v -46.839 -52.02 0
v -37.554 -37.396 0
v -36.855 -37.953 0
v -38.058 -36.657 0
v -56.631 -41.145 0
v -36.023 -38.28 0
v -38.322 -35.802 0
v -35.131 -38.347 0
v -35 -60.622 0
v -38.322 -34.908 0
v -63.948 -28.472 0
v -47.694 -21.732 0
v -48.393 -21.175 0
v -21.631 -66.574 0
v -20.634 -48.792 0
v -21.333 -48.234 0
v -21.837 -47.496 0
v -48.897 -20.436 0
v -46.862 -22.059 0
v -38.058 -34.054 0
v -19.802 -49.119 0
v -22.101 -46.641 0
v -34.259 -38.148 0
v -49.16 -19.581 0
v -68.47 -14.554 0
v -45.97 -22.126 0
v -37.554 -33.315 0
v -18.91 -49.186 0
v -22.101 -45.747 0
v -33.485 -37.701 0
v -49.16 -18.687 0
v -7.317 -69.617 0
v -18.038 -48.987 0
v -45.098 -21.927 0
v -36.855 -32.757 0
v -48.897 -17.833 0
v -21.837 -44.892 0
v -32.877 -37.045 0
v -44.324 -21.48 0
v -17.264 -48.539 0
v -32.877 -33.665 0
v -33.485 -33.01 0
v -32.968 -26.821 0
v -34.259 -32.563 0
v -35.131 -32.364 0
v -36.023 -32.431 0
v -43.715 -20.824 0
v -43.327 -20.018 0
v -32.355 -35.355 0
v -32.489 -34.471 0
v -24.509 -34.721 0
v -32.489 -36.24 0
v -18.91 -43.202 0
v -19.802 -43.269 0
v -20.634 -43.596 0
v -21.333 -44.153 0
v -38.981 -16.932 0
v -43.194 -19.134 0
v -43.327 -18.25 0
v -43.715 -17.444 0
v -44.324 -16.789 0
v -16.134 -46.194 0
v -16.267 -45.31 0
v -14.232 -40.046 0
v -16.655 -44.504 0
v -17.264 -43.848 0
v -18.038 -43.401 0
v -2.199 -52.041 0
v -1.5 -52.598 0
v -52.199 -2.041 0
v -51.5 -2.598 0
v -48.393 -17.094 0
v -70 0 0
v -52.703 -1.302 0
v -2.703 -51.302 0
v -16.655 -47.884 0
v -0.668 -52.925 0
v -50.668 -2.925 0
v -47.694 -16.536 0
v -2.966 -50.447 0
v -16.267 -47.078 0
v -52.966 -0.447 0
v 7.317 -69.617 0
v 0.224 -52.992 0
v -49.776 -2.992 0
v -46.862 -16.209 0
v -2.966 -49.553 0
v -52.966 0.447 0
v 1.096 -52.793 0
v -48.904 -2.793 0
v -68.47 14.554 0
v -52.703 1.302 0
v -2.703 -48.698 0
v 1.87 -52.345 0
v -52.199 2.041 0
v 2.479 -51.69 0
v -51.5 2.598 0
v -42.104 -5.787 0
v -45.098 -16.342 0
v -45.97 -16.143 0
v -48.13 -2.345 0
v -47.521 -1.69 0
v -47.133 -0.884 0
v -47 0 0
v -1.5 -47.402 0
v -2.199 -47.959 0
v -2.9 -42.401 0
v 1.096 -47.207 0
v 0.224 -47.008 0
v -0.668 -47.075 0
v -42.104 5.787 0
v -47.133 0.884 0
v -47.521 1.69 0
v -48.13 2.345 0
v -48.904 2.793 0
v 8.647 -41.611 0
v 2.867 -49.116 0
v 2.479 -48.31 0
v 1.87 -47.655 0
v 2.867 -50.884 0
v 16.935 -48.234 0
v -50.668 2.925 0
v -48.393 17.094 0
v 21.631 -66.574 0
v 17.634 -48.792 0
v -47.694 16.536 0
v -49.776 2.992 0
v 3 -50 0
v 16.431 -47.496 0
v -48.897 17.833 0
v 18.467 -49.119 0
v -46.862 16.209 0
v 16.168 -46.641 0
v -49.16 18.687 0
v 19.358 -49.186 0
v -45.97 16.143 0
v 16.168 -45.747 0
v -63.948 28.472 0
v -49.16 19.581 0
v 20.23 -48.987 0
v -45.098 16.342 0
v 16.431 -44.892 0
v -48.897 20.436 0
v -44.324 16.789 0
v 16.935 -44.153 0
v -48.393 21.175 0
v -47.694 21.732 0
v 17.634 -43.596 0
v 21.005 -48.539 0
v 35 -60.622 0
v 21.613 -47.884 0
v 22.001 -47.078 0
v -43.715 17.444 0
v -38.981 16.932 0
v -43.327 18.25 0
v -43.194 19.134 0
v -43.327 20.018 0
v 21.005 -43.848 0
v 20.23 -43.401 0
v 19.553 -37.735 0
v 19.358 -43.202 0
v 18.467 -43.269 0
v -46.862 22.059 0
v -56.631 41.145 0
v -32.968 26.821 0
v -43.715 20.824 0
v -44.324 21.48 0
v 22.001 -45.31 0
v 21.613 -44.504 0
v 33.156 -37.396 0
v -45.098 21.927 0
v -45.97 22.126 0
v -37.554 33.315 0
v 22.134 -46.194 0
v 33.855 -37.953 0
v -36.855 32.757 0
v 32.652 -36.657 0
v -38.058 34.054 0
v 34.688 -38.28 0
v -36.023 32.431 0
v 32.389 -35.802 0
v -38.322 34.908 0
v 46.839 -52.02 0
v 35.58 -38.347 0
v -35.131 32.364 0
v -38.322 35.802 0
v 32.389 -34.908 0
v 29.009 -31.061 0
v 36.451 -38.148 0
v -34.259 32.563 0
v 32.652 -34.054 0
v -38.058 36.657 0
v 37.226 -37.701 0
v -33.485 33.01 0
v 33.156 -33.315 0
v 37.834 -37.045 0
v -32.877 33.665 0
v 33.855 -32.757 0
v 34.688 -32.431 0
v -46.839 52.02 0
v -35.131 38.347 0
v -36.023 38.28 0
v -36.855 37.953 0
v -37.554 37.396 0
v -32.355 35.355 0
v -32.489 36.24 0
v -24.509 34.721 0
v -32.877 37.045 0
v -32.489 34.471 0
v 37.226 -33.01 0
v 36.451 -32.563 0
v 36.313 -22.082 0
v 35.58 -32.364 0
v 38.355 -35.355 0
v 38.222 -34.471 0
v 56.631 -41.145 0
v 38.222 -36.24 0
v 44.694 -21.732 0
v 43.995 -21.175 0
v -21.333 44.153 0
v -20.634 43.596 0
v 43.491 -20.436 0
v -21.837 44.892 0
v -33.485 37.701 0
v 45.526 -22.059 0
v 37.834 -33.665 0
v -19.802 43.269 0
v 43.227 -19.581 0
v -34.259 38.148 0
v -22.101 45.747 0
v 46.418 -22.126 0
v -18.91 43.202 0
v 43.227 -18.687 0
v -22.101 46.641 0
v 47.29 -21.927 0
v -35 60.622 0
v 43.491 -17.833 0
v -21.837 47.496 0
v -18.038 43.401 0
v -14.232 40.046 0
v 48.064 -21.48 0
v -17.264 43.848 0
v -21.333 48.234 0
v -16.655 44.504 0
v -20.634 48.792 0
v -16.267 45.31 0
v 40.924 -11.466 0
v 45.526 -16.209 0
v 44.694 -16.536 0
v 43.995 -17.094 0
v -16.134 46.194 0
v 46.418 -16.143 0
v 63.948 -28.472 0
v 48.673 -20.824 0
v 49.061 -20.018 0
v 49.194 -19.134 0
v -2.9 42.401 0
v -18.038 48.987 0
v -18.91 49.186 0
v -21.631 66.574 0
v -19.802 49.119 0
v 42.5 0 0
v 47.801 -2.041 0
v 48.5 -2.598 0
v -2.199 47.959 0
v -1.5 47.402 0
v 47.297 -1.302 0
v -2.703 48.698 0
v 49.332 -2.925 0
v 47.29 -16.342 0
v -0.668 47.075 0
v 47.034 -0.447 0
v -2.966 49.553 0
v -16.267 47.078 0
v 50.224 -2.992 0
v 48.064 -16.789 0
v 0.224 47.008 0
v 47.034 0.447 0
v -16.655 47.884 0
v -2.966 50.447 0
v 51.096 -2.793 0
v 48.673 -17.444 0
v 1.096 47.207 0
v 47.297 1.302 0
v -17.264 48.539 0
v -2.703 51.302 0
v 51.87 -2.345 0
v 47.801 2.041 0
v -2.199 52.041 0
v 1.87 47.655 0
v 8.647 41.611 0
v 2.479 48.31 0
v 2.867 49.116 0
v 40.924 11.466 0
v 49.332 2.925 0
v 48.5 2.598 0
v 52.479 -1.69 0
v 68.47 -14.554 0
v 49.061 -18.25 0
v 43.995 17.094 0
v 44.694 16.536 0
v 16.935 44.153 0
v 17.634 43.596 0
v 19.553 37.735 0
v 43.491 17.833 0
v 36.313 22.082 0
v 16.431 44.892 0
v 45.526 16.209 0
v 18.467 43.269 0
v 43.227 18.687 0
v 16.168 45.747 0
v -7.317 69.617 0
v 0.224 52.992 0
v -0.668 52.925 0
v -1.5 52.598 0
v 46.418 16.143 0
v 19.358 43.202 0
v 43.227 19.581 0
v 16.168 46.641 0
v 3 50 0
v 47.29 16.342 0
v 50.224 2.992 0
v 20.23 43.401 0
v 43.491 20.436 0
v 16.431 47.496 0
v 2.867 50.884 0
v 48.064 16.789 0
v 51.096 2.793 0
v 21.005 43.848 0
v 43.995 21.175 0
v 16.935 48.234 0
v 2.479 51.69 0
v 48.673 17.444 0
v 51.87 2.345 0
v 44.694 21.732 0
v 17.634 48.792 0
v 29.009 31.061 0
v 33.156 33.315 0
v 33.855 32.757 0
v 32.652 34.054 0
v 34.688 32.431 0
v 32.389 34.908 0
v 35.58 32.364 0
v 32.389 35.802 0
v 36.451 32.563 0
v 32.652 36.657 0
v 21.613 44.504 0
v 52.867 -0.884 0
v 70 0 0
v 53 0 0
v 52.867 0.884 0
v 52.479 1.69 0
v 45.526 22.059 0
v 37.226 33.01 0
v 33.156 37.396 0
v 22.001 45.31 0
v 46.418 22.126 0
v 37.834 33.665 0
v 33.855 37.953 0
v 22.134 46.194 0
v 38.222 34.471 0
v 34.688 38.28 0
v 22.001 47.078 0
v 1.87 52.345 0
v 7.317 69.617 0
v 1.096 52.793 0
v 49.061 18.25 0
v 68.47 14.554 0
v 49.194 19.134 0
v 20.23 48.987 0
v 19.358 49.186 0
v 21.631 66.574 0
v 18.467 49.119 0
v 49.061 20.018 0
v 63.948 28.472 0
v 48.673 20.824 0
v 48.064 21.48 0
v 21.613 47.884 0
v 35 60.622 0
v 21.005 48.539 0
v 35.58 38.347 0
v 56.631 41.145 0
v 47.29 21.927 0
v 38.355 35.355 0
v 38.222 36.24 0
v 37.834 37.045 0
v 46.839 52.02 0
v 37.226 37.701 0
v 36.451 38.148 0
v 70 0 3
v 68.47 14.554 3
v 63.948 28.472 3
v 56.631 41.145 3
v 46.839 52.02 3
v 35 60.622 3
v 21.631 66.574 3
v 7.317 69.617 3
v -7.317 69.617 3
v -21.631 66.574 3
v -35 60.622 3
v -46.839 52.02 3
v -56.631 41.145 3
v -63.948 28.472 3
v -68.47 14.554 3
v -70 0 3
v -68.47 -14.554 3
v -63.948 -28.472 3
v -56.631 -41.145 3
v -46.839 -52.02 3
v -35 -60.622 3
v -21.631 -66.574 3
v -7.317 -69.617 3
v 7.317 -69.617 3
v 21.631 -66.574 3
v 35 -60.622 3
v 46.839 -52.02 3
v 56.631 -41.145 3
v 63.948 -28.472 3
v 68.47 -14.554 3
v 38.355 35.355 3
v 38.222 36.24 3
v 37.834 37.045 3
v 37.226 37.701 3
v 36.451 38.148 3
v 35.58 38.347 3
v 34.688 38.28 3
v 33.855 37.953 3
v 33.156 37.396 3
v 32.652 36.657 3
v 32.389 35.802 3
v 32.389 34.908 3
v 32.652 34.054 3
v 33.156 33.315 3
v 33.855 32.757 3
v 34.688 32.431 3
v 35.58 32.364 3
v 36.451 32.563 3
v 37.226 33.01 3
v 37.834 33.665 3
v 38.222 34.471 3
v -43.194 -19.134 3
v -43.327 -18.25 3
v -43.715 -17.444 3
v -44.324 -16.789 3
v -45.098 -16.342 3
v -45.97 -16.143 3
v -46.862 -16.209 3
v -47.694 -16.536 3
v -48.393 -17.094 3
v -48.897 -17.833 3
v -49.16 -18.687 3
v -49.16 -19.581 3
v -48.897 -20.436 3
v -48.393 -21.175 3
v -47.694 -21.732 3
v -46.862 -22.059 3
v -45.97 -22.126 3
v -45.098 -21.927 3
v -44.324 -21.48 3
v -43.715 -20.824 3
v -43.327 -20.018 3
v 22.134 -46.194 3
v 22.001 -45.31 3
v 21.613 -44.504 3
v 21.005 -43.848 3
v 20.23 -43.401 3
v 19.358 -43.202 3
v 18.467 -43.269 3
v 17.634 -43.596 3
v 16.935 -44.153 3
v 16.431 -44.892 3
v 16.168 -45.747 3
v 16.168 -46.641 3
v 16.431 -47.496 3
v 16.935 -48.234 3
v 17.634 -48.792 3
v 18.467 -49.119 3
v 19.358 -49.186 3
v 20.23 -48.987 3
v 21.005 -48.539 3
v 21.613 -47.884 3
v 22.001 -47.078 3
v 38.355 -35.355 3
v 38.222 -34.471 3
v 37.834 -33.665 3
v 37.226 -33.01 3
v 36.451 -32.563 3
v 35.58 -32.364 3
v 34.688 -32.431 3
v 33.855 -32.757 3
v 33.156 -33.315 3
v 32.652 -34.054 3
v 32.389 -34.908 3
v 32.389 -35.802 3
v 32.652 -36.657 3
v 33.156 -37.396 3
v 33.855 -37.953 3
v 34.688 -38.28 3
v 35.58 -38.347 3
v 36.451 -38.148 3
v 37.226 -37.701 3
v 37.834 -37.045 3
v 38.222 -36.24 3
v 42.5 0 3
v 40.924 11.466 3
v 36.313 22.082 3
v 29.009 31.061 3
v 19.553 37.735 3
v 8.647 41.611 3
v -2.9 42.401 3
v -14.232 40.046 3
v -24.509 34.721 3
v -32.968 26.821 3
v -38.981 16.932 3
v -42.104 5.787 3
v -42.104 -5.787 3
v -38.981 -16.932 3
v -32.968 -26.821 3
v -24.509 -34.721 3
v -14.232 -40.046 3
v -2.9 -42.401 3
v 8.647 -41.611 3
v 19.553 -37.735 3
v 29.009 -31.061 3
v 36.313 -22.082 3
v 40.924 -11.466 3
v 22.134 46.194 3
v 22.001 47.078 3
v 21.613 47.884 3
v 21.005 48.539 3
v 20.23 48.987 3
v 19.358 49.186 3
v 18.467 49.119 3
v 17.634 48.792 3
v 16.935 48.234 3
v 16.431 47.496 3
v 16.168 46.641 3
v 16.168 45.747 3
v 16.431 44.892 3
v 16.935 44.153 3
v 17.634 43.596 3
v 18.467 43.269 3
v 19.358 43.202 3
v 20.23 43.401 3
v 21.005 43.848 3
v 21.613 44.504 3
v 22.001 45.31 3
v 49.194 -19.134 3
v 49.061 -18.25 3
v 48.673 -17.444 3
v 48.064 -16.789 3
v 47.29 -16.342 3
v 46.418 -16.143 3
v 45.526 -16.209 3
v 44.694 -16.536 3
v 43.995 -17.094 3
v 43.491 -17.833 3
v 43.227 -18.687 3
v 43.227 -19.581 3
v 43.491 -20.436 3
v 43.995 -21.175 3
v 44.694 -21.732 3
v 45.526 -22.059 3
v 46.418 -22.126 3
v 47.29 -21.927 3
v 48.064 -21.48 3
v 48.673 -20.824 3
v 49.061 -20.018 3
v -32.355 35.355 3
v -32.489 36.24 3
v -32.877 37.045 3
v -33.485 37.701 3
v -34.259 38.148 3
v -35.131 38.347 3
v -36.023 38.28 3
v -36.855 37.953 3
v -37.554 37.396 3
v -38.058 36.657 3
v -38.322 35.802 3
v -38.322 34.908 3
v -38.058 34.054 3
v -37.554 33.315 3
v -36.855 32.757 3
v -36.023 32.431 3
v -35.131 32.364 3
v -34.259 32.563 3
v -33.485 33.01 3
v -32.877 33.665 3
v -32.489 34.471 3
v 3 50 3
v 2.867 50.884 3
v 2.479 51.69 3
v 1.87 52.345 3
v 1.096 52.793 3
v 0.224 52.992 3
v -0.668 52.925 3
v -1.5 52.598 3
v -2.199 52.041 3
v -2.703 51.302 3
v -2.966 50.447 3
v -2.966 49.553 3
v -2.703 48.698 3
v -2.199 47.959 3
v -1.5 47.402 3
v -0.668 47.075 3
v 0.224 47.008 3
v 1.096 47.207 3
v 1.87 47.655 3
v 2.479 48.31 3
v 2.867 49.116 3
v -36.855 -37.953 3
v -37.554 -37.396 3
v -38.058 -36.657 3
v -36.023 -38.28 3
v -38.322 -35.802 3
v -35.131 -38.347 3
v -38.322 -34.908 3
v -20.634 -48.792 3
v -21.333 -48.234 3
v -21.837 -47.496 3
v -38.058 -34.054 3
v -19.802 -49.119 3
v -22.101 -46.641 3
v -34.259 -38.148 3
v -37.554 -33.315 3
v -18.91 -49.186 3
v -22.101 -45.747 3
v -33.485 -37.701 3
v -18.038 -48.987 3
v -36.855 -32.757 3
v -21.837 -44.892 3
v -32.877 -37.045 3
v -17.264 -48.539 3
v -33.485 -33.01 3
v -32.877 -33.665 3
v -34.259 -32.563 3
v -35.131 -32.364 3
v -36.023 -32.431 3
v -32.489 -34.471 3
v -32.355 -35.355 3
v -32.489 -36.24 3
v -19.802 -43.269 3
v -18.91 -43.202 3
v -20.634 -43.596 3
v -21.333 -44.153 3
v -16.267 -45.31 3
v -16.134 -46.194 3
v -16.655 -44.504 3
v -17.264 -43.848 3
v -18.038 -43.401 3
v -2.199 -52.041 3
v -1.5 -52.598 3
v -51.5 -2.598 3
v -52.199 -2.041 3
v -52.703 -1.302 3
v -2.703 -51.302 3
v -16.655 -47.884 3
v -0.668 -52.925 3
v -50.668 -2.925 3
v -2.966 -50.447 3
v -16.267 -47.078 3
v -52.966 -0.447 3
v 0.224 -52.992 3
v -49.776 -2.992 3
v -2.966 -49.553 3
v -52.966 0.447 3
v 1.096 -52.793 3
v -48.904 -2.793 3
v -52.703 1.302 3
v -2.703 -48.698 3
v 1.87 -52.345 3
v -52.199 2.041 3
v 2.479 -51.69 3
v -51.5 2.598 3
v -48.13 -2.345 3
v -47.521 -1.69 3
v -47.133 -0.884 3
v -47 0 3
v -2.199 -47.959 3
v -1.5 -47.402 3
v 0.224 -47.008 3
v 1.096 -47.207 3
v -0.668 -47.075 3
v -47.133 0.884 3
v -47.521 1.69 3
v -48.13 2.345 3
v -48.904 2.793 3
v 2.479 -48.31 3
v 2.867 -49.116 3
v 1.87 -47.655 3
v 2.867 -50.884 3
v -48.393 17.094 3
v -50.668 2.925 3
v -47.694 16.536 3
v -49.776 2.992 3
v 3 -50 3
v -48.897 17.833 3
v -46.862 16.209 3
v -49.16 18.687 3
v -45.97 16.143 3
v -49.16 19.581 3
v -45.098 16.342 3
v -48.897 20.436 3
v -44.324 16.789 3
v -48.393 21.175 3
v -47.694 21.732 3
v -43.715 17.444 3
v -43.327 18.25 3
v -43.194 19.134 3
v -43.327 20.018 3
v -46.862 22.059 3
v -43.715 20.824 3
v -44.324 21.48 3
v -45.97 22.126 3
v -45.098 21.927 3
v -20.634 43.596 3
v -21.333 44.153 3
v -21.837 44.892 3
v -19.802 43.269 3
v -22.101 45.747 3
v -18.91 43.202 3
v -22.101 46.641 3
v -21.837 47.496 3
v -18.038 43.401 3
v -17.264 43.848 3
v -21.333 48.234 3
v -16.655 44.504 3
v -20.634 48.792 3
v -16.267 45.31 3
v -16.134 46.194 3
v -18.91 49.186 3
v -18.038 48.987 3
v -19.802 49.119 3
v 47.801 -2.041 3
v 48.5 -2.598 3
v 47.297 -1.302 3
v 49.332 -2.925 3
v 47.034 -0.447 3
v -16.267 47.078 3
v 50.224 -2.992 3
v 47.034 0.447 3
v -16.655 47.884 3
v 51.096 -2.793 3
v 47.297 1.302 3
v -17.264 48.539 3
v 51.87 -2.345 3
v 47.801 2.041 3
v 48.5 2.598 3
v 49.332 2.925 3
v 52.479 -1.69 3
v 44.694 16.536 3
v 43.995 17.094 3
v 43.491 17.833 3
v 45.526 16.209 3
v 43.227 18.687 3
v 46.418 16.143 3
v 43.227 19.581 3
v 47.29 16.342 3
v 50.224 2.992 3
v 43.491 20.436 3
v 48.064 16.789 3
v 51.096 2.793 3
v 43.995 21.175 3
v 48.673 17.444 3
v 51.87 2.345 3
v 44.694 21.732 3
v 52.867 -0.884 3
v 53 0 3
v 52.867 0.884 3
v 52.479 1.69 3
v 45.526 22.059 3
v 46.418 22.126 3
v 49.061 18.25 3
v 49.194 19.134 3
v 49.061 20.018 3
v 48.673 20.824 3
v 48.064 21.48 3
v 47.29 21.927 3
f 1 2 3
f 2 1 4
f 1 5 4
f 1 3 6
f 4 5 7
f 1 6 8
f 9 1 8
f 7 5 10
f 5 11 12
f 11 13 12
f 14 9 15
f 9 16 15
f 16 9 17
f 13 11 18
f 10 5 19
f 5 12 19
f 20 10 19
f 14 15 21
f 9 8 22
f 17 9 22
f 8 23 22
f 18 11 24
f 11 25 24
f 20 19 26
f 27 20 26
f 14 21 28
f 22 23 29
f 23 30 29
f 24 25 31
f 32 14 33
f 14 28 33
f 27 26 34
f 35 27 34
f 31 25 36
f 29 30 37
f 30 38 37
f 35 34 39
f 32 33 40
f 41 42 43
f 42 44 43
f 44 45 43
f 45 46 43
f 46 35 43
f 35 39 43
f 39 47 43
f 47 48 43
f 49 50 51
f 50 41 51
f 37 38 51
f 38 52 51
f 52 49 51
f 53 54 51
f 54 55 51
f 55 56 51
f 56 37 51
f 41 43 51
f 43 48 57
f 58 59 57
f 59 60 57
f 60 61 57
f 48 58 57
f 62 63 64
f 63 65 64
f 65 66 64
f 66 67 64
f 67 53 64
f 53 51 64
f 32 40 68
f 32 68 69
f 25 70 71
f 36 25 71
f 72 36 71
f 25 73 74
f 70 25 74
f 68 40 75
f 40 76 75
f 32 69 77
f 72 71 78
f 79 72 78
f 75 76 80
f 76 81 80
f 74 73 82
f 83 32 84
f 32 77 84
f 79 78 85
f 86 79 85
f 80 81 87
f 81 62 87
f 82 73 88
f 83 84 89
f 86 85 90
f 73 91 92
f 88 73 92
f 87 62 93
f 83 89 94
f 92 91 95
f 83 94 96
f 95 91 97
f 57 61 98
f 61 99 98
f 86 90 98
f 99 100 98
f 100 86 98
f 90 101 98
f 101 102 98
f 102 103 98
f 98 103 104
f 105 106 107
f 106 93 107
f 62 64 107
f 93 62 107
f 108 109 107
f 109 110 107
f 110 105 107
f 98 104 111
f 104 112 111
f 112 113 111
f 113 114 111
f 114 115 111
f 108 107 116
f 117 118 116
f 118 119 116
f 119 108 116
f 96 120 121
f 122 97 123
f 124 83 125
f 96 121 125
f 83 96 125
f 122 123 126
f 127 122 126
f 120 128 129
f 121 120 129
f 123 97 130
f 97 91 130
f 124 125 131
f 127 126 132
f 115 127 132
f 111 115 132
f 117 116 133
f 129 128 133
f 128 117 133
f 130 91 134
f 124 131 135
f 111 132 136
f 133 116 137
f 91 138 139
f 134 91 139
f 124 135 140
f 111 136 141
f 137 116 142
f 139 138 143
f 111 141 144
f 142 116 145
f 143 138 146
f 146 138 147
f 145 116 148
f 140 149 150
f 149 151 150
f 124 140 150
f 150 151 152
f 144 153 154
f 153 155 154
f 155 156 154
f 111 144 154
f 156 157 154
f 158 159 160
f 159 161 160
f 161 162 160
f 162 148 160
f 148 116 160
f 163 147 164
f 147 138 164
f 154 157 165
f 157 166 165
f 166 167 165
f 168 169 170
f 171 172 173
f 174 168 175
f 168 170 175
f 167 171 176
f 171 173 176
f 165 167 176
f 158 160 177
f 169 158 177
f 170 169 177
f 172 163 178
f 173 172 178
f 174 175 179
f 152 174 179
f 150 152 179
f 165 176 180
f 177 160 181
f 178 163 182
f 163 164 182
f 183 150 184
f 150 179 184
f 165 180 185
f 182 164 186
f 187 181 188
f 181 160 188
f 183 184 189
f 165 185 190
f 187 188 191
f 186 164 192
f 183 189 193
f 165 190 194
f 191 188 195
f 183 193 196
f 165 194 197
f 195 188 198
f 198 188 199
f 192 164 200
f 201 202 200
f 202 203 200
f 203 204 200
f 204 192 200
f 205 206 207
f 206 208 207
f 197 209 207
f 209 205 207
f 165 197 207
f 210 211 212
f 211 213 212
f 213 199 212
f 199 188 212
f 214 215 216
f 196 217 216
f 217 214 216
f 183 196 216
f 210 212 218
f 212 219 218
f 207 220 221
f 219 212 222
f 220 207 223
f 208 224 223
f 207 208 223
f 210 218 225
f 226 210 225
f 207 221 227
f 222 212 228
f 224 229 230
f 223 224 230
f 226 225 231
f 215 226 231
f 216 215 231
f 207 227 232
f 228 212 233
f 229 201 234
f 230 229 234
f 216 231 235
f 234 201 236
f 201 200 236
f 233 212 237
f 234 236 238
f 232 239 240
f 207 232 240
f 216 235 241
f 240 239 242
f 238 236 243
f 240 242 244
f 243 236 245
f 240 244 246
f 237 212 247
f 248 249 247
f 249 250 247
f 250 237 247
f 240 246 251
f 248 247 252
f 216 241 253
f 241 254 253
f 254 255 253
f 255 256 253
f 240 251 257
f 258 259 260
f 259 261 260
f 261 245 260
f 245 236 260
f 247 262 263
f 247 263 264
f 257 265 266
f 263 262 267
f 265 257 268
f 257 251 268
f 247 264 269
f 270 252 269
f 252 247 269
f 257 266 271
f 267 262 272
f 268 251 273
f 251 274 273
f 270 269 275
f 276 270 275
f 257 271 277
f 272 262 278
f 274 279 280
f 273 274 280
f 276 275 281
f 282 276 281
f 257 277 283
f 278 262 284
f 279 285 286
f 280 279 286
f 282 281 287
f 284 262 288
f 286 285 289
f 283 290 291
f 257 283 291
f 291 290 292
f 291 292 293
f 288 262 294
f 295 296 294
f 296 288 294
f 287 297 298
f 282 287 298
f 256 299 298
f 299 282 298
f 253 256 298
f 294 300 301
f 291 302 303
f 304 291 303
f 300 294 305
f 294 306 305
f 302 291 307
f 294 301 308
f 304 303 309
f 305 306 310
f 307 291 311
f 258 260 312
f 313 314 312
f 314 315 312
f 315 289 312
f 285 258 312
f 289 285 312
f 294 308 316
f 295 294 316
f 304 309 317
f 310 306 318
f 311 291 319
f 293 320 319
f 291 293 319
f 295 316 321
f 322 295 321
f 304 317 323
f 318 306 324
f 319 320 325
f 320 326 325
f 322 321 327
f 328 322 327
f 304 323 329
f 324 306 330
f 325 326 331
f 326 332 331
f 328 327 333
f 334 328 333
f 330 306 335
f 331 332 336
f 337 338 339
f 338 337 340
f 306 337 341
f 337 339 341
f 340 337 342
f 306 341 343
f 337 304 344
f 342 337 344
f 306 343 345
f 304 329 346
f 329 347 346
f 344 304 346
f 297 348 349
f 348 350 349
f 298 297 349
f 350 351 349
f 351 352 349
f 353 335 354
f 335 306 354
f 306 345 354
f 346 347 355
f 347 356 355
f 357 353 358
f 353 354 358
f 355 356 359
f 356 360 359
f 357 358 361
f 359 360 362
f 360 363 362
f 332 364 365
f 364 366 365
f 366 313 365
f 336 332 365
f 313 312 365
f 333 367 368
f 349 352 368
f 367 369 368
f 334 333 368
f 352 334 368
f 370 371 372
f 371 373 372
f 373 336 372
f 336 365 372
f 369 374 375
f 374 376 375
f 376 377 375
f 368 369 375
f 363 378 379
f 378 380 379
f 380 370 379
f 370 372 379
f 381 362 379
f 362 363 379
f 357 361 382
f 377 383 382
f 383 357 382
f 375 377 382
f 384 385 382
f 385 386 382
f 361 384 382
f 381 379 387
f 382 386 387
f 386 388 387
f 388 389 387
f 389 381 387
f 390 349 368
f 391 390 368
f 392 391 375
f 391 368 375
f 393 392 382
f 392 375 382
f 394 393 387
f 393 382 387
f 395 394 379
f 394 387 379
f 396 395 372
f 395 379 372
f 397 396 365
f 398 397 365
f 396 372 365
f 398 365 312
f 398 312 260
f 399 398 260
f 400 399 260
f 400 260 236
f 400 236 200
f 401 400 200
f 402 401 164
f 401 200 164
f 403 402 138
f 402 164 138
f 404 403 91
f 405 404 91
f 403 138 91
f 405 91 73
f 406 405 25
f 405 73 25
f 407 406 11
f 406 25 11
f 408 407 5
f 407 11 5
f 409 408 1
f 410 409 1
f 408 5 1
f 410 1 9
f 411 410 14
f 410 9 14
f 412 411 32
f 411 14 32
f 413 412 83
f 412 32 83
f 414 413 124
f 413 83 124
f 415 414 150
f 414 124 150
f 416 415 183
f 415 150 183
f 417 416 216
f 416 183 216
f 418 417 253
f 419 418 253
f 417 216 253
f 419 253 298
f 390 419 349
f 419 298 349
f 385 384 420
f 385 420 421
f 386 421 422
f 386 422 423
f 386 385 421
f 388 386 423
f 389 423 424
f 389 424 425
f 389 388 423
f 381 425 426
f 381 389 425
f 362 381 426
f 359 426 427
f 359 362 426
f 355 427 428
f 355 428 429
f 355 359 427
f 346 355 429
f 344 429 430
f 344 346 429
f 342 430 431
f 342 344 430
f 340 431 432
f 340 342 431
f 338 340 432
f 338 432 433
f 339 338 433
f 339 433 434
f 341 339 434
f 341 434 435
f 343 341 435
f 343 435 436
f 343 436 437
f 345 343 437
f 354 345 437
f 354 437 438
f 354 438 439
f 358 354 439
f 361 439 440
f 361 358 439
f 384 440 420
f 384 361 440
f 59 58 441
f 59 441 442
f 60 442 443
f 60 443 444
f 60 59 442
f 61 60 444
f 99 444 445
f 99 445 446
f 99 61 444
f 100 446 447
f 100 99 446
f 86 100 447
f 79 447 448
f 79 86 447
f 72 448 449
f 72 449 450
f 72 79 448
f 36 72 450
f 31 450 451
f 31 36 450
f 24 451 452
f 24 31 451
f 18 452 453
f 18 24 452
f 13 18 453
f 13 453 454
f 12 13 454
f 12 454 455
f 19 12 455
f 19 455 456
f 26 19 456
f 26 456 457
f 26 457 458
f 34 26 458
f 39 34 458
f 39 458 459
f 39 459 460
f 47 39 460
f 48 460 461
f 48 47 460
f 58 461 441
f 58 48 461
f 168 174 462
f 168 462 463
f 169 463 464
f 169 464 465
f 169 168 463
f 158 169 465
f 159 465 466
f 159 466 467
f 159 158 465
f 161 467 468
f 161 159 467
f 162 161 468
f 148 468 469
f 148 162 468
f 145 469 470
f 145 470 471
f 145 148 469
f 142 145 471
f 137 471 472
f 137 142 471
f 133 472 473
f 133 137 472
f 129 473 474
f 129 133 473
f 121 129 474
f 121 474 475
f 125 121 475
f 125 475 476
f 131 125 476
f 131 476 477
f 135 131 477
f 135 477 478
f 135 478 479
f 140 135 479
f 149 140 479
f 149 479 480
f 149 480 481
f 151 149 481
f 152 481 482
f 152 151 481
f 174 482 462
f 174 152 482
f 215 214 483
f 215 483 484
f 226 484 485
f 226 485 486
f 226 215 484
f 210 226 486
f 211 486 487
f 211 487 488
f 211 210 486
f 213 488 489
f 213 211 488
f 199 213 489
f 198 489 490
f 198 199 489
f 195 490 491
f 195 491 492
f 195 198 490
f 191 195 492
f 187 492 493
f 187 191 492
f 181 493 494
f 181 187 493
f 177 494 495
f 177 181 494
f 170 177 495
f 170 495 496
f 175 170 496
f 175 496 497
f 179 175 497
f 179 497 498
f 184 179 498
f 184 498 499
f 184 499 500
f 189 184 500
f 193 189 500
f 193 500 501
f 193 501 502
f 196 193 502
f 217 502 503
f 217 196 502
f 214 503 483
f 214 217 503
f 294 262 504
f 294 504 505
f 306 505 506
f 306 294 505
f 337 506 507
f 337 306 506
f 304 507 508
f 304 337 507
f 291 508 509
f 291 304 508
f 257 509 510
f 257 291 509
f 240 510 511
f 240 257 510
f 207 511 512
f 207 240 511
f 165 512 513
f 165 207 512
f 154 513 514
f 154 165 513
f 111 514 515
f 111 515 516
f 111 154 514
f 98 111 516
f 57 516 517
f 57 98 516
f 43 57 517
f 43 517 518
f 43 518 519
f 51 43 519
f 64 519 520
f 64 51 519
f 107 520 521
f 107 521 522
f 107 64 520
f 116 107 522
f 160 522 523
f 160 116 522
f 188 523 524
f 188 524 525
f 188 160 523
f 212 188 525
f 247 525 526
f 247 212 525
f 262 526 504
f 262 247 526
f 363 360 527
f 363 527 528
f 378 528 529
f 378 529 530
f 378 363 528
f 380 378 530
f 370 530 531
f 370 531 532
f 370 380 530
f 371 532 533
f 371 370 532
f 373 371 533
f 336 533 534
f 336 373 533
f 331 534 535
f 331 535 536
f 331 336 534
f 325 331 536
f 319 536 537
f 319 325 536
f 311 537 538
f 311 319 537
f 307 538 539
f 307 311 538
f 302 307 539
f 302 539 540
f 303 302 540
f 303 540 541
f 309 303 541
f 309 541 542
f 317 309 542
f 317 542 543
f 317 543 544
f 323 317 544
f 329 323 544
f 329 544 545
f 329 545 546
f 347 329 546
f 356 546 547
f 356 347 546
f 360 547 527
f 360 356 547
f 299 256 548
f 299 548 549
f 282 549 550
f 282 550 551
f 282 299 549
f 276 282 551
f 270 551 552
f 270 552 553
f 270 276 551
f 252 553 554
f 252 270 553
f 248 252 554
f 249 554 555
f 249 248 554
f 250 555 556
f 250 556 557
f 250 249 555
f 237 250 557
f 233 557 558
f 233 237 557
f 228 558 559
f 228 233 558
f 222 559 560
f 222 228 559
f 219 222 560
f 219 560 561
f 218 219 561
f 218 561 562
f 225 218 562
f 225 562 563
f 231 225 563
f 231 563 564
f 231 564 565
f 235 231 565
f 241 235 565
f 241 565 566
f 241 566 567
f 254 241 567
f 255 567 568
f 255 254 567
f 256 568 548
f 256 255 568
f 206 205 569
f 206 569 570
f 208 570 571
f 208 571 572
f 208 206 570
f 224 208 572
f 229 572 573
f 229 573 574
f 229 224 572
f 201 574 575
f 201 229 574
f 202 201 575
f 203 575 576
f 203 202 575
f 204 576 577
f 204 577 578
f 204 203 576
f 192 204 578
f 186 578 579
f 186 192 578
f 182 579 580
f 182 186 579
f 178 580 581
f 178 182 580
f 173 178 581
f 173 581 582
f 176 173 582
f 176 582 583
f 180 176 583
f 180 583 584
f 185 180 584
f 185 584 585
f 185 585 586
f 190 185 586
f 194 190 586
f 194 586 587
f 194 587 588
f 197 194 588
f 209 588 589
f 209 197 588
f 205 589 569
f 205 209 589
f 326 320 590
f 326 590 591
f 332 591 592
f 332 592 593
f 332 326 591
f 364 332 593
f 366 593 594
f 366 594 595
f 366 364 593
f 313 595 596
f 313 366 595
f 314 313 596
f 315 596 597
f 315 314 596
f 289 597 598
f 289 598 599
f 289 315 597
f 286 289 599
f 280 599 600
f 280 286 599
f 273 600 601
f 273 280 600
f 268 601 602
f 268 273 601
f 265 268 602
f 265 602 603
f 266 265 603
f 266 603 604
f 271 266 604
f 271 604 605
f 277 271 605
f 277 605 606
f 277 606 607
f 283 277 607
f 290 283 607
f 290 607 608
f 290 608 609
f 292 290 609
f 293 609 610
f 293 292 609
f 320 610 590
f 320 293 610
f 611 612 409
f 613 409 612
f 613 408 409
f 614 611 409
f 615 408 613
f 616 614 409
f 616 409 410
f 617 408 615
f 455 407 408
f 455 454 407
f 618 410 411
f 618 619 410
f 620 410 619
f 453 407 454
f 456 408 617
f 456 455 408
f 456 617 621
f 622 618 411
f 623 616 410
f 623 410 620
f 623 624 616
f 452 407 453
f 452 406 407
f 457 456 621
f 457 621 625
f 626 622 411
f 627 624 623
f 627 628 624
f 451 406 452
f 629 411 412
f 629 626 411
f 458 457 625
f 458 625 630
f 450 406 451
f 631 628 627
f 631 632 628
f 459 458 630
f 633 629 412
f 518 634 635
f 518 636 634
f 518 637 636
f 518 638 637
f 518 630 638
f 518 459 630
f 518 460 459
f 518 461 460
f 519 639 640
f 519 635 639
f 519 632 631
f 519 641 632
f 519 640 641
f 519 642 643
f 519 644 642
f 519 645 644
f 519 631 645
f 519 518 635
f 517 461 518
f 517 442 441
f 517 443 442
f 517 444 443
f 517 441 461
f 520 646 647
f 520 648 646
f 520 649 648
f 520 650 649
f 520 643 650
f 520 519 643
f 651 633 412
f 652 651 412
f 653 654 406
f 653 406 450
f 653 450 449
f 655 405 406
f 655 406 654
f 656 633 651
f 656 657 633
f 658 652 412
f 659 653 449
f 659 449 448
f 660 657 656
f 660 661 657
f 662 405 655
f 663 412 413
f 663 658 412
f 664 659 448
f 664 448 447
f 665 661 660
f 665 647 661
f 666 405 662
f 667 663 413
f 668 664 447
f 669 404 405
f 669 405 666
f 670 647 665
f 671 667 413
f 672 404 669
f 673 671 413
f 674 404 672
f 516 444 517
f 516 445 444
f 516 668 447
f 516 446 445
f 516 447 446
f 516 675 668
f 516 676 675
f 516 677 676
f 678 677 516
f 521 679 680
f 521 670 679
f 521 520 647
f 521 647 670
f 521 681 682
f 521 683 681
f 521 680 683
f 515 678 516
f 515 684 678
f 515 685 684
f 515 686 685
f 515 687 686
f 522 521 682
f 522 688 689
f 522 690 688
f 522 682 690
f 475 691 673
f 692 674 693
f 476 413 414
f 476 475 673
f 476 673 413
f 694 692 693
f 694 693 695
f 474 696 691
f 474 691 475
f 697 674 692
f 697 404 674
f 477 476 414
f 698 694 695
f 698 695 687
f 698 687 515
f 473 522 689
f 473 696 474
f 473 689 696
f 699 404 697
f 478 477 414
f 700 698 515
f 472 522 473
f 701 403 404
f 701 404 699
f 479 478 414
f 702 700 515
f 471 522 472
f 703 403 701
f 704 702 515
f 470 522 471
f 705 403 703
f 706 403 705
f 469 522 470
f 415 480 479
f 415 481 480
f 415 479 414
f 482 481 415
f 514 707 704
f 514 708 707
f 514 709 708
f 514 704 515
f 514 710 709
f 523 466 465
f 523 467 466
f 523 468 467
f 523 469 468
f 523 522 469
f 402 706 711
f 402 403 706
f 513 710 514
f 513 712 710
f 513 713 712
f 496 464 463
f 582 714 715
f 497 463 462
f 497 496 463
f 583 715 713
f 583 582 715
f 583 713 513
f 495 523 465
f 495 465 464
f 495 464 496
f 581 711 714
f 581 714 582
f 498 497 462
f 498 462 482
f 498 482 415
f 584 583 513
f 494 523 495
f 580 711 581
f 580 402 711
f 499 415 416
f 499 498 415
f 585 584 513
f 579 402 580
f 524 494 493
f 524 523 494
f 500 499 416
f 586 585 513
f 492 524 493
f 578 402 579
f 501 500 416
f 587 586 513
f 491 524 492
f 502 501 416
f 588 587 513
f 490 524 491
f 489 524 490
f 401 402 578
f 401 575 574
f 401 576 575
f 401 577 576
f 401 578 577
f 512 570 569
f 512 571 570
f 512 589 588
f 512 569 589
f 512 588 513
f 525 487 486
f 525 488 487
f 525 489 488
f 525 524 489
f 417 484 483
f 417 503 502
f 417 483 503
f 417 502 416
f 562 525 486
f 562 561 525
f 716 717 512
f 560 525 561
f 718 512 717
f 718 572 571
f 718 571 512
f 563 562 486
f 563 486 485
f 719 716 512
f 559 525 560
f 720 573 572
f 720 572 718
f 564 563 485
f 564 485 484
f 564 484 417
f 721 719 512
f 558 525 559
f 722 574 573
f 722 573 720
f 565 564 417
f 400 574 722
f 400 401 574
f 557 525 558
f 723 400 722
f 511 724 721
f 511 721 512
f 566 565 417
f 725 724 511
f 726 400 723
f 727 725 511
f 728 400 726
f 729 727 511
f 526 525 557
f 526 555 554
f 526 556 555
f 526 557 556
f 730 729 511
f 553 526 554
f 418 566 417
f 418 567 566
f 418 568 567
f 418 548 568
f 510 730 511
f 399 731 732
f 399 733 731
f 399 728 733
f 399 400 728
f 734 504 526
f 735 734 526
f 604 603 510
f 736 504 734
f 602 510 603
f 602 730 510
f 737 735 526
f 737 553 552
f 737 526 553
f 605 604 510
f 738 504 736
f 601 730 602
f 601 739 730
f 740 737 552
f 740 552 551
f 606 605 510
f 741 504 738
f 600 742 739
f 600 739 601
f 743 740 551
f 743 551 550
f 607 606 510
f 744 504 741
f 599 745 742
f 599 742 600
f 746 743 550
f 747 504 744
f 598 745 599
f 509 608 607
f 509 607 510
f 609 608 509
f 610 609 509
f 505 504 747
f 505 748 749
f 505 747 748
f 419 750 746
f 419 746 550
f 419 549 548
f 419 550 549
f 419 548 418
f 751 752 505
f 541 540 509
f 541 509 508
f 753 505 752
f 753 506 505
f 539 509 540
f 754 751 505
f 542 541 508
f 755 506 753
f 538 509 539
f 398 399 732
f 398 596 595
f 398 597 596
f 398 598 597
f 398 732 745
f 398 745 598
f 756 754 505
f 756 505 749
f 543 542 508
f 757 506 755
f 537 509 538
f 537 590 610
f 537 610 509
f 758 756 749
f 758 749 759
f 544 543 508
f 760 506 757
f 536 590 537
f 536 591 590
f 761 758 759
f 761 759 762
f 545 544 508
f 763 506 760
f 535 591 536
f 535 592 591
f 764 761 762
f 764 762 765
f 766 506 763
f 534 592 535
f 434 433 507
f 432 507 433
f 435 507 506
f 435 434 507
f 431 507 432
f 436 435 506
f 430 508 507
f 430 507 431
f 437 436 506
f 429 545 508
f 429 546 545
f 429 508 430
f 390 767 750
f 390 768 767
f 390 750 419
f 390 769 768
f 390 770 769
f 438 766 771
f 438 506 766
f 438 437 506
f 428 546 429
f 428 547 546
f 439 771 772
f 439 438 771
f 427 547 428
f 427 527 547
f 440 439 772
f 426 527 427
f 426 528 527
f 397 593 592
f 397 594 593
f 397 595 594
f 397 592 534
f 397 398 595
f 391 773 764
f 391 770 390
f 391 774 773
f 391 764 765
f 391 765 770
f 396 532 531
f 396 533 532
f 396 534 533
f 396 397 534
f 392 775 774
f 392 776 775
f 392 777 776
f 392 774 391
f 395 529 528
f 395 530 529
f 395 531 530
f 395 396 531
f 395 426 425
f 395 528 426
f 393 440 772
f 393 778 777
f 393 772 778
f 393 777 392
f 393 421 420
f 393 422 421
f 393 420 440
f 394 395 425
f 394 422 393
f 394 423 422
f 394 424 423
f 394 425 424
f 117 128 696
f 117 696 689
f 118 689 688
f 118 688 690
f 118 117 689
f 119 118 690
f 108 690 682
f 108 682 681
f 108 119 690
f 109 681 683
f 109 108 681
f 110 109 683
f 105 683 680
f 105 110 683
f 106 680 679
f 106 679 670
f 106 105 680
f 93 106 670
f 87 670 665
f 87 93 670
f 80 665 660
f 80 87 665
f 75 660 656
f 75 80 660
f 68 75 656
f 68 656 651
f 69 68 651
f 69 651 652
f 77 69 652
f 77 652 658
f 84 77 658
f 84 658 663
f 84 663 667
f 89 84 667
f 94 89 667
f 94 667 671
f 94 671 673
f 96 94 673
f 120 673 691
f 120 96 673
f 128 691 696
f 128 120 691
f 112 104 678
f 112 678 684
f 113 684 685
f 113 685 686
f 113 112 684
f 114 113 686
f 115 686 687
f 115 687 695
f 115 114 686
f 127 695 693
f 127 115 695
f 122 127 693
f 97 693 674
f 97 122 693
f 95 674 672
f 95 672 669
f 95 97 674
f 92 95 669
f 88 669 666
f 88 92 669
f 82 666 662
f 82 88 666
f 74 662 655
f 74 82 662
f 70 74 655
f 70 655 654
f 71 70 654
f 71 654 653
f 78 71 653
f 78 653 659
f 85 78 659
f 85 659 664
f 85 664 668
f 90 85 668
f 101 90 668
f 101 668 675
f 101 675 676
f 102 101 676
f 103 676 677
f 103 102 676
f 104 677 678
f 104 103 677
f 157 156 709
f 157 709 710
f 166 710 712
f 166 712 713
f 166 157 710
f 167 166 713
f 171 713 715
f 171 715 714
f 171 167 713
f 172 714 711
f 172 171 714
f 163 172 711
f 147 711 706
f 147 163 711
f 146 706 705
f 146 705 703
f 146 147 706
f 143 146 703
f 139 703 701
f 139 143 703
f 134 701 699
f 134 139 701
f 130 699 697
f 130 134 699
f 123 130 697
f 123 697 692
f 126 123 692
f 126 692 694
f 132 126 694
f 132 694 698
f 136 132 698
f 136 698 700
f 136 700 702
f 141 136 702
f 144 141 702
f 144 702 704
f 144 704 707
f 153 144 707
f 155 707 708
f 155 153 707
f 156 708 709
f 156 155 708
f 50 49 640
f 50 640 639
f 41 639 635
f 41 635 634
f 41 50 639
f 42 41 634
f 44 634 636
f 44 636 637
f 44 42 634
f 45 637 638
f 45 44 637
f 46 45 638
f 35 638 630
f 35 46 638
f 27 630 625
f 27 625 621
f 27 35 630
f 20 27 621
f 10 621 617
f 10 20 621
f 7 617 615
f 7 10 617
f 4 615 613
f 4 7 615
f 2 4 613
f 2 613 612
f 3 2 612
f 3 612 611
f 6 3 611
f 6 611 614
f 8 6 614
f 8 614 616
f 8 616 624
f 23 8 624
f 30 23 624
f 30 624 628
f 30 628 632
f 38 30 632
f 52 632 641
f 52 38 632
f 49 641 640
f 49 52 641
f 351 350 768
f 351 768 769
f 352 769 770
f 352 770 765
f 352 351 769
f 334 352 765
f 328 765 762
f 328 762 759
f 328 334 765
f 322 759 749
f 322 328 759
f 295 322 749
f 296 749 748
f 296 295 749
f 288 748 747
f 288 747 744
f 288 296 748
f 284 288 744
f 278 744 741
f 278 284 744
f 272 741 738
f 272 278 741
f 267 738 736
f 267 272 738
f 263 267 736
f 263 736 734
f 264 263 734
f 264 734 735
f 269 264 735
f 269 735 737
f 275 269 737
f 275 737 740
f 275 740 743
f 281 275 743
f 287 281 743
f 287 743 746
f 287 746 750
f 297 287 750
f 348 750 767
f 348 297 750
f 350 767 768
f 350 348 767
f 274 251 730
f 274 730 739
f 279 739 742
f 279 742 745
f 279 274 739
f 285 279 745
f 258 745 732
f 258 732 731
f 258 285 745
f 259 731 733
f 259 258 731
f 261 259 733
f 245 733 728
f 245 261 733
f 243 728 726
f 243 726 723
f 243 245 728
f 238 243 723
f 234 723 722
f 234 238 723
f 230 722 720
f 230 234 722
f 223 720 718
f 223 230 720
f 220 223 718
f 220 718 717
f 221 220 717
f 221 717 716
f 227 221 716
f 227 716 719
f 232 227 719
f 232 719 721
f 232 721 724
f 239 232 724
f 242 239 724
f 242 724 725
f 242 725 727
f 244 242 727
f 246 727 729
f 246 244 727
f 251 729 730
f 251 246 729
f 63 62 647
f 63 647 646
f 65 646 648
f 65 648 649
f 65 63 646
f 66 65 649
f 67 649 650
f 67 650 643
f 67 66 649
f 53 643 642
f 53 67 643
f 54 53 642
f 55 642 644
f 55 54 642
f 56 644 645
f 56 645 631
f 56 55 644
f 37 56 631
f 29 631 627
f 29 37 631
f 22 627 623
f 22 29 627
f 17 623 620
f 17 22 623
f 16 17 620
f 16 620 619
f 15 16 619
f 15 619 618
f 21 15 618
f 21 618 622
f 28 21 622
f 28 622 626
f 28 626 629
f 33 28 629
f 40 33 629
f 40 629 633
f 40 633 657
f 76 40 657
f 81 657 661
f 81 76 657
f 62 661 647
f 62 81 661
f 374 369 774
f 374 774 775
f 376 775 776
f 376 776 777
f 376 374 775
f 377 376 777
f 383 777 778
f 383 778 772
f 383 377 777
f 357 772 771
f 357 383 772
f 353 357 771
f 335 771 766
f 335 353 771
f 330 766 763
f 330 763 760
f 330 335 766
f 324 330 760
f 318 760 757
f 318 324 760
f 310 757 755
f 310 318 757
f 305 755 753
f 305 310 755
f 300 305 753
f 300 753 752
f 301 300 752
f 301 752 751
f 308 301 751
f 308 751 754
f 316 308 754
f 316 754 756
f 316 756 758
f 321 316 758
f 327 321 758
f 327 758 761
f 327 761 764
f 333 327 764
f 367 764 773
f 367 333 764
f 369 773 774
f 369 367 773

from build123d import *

# Parameters (mm, degrees)
F0_R     = 70
F0_R_2   = 3
F0_R_3   = 42.5
F1_DEPTH = 3


with BuildPart() as f1:
    # F0 (on Top) → F1 (new body)
    with BuildSketch(Plane.XY):
        Circle(F0_R)
        with Locations((-35.355339, -35.355339)):
            Circle(F0_R_2, mode=Mode.SUBTRACT)
        with Locations((-19.134172, -46.193977)):
            Circle(F0_R_2, mode=Mode.SUBTRACT)
        with Locations((-46.193977, -19.134172)):
            Circle(F0_R_2, mode=Mode.SUBTRACT)
        with Locations((0, -50)):
            Circle(F0_R_2, mode=Mode.SUBTRACT)
        with Locations((19.134172, -46.193977)):
            Circle(F0_R_2, mode=Mode.SUBTRACT)
        with Locations((35.355339, -35.355339)):
            Circle(F0_R_2, mode=Mode.SUBTRACT)
        with Locations((46.193977, -19.134172)):
            Circle(F0_R_2, mode=Mode.SUBTRACT)
        with Locations((-50, 0)):
            Circle(F0_R_2, mode=Mode.SUBTRACT)
        with Locations((-46.193977, 19.134172)):
            Circle(F0_R_2, mode=Mode.SUBTRACT)
        with Locations((-35.355339, 35.355339)):
            Circle(F0_R_2, mode=Mode.SUBTRACT)
        with Locations((-19.134172, 46.193977)):
            Circle(F0_R_2, mode=Mode.SUBTRACT)
        Circle(F0_R_3, mode=Mode.SUBTRACT)
        with Locations((50, 0)):
            Circle(F0_R_2, mode=Mode.SUBTRACT)
        with Locations((46.193977, 19.134172)):
            Circle(F0_R_2, mode=Mode.SUBTRACT)
        with Locations((0, 50)):
            Circle(F0_R_2, mode=Mode.SUBTRACT)
        with Locations((19.134172, 46.193977)):
            Circle(F0_R_2, mode=Mode.SUBTRACT)
        with Locations((35.355339, 35.355339)):
            Circle(F0_R_2, mode=Mode.SUBTRACT)
    extrude(amount=F1_DEPTH)


solid = f1.part
